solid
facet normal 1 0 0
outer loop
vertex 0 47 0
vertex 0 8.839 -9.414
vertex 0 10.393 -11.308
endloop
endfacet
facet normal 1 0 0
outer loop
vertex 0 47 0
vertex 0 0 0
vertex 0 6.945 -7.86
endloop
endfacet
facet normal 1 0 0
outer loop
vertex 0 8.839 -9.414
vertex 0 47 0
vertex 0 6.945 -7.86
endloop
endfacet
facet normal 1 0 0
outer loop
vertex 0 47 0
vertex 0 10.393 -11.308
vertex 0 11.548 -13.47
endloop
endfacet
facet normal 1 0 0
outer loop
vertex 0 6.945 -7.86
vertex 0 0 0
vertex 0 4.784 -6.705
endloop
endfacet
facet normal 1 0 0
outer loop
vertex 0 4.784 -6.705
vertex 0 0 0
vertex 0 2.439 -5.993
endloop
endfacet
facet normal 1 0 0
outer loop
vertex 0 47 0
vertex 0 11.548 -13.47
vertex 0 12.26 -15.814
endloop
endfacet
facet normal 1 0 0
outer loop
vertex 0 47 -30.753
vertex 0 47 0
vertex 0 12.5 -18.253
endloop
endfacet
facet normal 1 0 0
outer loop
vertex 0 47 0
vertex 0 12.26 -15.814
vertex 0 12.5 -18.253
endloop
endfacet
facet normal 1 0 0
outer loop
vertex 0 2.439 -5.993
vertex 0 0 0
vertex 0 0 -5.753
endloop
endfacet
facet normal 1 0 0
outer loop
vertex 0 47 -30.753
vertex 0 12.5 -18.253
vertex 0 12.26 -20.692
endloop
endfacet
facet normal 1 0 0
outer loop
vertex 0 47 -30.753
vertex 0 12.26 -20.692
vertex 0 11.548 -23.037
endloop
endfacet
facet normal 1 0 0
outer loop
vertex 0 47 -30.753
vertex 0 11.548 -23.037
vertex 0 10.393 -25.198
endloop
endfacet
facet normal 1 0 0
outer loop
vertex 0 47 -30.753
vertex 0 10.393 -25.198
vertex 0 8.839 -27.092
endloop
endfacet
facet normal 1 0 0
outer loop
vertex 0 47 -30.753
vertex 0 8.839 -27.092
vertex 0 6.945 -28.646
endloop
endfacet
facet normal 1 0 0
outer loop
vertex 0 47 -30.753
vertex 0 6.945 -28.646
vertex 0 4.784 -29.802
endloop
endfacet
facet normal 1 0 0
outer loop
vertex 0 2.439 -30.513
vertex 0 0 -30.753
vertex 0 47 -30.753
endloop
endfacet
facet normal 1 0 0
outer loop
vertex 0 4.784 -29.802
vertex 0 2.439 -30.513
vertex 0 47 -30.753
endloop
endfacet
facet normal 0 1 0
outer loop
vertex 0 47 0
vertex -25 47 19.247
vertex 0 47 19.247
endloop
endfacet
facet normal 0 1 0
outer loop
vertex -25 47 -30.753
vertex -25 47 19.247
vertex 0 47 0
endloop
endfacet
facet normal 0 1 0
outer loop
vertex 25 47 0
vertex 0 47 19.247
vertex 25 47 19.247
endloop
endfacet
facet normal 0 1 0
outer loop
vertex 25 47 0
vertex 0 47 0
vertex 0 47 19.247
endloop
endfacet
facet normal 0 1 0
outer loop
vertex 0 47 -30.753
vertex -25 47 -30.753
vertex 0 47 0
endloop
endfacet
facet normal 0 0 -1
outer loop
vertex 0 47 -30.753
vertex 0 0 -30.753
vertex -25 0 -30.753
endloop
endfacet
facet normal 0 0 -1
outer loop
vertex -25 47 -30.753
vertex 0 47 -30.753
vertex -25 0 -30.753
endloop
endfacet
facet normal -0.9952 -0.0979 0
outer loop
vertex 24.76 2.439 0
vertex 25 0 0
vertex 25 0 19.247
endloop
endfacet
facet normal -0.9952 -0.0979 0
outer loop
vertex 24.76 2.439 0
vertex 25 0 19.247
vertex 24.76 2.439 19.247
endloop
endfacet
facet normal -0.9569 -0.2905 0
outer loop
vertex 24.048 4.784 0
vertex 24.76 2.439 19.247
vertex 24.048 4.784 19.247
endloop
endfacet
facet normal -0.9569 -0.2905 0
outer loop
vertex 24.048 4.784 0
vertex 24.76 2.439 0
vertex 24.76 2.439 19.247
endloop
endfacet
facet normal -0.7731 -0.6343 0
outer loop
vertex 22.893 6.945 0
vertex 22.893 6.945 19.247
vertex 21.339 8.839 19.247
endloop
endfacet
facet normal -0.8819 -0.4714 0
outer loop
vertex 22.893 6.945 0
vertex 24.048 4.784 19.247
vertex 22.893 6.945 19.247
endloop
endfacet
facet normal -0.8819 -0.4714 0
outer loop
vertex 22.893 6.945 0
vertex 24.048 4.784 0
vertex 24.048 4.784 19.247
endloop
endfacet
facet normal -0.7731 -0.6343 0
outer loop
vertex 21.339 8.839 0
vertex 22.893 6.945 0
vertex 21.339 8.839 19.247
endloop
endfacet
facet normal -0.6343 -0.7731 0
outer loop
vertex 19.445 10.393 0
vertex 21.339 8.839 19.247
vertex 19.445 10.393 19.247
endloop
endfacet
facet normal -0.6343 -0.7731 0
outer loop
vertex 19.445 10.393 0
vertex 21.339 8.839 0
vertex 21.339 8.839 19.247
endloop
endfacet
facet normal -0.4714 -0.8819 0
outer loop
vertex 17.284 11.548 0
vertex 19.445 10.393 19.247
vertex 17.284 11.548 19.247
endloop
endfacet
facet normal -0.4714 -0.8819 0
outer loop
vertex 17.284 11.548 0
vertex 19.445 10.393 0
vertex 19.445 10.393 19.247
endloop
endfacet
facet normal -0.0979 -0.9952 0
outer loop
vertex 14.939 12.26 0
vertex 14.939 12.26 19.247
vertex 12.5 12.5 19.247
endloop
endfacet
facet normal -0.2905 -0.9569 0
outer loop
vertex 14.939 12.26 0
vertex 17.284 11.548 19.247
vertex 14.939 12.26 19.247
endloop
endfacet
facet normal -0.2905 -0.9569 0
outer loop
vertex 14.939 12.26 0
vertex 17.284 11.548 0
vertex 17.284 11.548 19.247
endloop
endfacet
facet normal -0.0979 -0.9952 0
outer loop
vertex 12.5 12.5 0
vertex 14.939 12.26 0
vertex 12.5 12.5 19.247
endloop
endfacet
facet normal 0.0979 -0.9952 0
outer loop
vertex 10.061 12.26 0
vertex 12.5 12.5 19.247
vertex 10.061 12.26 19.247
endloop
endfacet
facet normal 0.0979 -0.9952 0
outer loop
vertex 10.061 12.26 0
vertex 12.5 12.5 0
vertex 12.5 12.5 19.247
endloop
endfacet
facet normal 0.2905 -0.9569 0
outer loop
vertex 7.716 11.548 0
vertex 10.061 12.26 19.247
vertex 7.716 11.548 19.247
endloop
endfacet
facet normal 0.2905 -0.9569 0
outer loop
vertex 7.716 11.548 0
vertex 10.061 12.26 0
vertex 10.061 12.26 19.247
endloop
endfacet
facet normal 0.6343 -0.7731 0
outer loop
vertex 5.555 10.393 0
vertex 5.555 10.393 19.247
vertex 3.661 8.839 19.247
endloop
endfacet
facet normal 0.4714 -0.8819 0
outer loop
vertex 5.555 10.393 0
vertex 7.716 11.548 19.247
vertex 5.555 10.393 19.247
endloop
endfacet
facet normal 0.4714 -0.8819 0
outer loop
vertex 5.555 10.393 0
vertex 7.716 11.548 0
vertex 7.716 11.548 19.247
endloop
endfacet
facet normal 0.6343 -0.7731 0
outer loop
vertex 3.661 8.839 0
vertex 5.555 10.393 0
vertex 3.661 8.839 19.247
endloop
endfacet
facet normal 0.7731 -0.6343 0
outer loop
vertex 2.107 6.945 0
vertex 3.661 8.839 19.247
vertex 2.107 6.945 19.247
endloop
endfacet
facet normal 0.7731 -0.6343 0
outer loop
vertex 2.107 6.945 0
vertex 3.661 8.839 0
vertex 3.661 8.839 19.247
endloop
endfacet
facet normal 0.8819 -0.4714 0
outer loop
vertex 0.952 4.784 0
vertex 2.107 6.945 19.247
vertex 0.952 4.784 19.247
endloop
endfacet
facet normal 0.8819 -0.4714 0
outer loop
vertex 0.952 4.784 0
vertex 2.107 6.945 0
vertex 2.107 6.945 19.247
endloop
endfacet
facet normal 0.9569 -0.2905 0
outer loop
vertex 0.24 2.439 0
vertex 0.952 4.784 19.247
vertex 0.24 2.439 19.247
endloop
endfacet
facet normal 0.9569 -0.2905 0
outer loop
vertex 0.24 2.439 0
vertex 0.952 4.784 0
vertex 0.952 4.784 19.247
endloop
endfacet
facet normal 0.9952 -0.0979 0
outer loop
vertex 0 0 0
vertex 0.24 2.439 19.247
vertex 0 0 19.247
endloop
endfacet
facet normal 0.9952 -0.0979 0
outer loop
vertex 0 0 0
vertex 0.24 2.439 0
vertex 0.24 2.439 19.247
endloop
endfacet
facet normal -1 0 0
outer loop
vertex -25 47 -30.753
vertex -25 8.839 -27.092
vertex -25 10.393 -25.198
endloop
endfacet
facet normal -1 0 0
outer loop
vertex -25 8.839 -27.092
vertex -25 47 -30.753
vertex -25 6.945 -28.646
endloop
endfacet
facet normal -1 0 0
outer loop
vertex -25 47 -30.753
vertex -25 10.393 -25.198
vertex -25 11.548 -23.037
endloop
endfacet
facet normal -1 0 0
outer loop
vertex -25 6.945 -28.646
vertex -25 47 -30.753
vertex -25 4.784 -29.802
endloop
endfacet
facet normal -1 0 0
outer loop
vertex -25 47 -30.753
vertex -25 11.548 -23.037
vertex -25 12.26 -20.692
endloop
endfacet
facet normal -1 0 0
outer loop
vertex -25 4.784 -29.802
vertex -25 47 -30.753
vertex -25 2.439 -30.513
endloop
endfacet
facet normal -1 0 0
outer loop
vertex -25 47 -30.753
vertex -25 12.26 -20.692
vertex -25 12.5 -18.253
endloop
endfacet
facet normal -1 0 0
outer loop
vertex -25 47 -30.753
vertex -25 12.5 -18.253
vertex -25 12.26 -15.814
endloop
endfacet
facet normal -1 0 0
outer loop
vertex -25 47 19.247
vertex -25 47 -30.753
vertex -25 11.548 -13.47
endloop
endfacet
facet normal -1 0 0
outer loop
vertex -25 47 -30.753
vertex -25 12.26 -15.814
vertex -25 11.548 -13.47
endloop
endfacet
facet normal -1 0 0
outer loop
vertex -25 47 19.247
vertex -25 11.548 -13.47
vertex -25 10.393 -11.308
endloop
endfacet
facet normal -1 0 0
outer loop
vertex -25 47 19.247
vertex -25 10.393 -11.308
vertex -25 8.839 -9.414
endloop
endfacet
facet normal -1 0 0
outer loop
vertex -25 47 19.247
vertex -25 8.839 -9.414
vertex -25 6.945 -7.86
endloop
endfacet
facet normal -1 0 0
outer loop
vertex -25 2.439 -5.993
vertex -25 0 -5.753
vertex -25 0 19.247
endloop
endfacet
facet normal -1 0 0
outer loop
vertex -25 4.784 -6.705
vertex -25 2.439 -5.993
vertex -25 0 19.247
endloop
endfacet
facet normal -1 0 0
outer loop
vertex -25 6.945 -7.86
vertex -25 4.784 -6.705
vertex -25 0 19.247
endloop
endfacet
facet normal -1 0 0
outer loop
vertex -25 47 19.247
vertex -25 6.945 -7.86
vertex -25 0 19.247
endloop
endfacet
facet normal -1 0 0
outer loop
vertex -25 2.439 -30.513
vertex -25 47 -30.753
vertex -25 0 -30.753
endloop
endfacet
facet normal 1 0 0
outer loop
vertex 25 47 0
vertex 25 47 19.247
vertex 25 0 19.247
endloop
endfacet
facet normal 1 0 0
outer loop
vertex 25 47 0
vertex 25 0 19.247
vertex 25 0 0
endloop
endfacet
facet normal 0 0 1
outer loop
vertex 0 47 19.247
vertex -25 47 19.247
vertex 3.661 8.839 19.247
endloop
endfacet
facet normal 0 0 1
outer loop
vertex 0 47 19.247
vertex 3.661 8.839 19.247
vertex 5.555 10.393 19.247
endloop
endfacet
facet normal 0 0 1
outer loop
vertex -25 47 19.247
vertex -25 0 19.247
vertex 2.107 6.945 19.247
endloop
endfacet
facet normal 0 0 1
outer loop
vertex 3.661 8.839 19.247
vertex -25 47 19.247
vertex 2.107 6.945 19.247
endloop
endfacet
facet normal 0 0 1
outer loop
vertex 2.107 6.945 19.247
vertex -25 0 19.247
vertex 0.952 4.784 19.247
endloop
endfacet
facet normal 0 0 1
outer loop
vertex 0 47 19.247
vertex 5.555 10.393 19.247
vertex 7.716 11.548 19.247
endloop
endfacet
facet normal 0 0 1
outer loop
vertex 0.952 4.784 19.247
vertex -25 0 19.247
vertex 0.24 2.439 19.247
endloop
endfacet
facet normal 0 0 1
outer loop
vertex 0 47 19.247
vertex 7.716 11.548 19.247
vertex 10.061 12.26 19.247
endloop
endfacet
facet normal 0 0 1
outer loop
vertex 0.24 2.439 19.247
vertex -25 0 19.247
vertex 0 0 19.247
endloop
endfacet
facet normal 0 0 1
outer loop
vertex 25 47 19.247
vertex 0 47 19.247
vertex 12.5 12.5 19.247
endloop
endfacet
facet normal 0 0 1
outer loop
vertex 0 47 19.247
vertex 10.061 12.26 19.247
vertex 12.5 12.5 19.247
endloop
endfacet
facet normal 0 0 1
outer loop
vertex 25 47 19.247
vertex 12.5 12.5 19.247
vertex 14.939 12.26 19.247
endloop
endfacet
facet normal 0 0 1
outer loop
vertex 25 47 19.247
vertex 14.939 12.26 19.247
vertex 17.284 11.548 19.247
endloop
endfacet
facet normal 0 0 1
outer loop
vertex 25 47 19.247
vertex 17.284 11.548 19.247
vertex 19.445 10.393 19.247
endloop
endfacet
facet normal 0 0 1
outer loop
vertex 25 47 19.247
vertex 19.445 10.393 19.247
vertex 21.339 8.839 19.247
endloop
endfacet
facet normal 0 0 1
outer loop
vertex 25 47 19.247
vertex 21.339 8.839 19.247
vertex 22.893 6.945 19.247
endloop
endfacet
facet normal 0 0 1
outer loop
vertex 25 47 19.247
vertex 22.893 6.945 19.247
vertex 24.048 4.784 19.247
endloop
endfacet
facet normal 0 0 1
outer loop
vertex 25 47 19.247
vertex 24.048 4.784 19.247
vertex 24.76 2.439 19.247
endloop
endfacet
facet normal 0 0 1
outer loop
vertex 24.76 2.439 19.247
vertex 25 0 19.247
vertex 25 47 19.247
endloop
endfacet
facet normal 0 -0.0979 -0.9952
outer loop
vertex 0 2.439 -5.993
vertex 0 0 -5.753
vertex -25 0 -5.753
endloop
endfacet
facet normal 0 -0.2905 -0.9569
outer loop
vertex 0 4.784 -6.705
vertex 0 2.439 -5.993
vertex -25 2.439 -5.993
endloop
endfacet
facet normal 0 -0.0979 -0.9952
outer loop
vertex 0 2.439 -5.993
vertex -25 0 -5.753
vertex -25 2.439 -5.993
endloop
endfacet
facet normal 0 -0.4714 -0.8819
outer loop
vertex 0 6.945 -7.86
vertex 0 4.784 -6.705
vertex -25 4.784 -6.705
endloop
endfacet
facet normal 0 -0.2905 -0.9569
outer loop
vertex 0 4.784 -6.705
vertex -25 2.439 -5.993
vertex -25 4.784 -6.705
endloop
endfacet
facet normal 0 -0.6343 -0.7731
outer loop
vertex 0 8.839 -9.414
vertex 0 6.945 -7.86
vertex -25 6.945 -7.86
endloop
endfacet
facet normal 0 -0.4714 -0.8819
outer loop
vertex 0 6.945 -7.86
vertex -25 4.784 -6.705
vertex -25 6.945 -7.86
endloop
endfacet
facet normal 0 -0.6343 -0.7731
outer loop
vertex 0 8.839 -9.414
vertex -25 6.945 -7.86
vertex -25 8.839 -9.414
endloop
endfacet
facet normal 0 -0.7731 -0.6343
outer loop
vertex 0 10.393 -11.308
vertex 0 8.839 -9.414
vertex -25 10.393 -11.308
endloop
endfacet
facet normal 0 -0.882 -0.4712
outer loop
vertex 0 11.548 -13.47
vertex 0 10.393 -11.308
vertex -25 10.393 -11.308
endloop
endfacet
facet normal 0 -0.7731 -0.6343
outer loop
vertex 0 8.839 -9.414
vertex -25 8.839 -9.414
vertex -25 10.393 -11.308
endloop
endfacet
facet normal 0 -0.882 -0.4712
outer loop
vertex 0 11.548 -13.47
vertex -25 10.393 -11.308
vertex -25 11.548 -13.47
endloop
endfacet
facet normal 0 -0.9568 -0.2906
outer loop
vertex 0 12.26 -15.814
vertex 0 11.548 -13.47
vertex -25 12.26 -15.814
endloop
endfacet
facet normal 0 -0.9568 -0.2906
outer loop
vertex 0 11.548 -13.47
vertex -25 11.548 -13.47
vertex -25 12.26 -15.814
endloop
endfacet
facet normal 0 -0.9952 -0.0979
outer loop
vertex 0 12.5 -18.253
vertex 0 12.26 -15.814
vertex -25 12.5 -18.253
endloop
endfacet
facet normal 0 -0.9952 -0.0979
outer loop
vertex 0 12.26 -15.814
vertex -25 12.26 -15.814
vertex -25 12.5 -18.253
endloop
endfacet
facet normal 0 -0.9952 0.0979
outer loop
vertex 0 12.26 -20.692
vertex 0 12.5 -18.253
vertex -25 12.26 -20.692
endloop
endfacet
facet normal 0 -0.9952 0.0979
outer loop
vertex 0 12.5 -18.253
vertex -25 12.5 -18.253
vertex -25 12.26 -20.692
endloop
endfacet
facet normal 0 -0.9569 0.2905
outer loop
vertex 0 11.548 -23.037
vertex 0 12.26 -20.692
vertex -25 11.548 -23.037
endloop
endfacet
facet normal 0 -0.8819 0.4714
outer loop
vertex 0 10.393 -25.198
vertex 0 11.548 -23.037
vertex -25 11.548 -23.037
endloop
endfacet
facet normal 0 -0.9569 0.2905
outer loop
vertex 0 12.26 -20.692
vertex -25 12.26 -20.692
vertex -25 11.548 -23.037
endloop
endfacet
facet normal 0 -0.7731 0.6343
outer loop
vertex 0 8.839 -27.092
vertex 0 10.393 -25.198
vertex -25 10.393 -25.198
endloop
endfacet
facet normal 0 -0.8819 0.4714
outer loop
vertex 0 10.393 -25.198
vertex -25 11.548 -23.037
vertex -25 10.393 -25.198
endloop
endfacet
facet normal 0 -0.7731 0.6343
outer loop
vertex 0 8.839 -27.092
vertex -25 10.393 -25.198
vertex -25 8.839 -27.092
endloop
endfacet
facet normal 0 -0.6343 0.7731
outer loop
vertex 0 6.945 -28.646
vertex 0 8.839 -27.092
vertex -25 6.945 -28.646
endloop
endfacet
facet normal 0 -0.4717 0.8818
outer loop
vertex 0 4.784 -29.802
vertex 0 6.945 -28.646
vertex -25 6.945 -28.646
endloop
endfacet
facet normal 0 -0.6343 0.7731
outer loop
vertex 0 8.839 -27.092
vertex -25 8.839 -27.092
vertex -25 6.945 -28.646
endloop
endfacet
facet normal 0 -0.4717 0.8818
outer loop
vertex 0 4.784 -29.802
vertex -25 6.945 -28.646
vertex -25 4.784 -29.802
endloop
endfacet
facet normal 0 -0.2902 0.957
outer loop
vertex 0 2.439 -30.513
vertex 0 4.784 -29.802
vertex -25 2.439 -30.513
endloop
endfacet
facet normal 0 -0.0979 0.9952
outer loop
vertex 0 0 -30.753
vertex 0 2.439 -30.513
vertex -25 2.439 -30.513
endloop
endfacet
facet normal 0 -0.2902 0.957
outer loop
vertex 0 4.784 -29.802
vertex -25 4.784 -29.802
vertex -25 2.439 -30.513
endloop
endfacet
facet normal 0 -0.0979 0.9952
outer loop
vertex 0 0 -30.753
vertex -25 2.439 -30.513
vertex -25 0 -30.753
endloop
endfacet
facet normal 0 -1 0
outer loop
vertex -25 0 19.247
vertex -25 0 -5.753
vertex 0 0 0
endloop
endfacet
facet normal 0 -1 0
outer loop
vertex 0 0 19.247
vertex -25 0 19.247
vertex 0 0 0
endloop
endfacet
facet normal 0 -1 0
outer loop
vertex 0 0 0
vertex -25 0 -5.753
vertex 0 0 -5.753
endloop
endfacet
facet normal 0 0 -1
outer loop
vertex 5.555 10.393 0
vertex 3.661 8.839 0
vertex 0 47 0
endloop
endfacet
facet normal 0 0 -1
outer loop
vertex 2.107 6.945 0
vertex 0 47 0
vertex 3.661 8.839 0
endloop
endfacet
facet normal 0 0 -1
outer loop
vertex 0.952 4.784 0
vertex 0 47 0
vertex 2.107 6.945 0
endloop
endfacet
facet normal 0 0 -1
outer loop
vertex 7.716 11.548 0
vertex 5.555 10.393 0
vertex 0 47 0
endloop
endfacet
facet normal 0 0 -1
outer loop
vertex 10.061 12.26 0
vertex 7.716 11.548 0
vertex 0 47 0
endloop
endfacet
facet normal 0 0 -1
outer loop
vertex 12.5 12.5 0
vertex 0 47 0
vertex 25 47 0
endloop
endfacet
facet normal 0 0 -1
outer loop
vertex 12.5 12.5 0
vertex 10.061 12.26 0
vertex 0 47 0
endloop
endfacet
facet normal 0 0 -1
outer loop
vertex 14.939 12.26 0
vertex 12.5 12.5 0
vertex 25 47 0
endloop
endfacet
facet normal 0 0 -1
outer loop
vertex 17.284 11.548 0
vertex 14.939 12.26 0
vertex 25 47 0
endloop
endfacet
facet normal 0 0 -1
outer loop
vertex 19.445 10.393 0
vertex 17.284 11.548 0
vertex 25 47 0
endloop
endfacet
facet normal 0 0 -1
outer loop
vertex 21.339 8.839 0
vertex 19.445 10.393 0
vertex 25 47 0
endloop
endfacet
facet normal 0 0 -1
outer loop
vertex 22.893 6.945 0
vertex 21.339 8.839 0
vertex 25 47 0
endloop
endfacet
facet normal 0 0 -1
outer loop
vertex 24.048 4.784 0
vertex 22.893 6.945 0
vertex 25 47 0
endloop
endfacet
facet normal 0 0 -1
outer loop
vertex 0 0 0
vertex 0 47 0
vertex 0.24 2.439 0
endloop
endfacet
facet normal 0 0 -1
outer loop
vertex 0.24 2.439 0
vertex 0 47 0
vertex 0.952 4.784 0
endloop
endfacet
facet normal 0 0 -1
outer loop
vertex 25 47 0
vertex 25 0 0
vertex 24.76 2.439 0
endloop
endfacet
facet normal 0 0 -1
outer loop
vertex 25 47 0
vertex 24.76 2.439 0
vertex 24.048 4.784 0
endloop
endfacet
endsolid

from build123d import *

# Parameters (mm, degrees)
SKETCH1_W               = 25
SKETCH1_H               = 19.246899001
BOSS_EXTRUDE1_DEPTH     = 47
CUT_EXTRUDE1_DEPTH      = 74.034238546
CUT_EXTRUDE1_DEPTH_BACK = 50
SKETCH3_R               = 12.5
CUT_EXTRUDE2_DEPTH      = 50


with BuildPart() as part:
    # Sketch1 → Boss-Extrude1 (new body)
    with BuildSketch(Plane(origin=(0, 0, 0), x_dir=(1, 0, 0), z_dir=(0, 1, 0))):
        Polygon((0, -19.246899001), (0, 0), (0, 30.753100999), (-25, 30.753100999), (-25, -19.246899001), align=None)
        with Locations((12.5, -9.623449501)):
            Rectangle(SKETCH1_W, SKETCH1_H)
    extrude(amount=BOSS_EXTRUDE1_DEPTH)

    # Sketch2 → Cut-Extrude1 (cut, two sides: drawn at the far end of the back side and taken through both)
    with BuildSketch(Plane.XY.offset(19.246899001).offset(-CUT_EXTRUDE1_DEPTH_BACK)):
        with BuildLine():
            Line((25, -147.244307714), (25, 0))
            ThreePointArc((25, 0), (12.5, 12.5), (0, 0))
            Line((0, 0), (0, -147.244307714))
            Line((0, -147.244307714), (0, -441.732923143))
            Line((0, -441.732923143), (25, -441.732923143))
            Line((25, -441.732923143), (25, -147.244307714))
        make_face()
    extrude(amount=CUT_EXTRUDE1_DEPTH + CUT_EXTRUDE1_DEPTH_BACK, mode=Mode.SUBTRACT)

    # Sketch3 → Cut-Extrude2 (cut)
    with BuildSketch(Plane.ZY.offset(25)):
        with Locations((-18.253100999, 0)):
            Circle(SKETCH3_R)
    extrude(amount=-CUT_EXTRUDE2_DEPTH, mode=Mode.SUBTRACT)


solid = part.part
